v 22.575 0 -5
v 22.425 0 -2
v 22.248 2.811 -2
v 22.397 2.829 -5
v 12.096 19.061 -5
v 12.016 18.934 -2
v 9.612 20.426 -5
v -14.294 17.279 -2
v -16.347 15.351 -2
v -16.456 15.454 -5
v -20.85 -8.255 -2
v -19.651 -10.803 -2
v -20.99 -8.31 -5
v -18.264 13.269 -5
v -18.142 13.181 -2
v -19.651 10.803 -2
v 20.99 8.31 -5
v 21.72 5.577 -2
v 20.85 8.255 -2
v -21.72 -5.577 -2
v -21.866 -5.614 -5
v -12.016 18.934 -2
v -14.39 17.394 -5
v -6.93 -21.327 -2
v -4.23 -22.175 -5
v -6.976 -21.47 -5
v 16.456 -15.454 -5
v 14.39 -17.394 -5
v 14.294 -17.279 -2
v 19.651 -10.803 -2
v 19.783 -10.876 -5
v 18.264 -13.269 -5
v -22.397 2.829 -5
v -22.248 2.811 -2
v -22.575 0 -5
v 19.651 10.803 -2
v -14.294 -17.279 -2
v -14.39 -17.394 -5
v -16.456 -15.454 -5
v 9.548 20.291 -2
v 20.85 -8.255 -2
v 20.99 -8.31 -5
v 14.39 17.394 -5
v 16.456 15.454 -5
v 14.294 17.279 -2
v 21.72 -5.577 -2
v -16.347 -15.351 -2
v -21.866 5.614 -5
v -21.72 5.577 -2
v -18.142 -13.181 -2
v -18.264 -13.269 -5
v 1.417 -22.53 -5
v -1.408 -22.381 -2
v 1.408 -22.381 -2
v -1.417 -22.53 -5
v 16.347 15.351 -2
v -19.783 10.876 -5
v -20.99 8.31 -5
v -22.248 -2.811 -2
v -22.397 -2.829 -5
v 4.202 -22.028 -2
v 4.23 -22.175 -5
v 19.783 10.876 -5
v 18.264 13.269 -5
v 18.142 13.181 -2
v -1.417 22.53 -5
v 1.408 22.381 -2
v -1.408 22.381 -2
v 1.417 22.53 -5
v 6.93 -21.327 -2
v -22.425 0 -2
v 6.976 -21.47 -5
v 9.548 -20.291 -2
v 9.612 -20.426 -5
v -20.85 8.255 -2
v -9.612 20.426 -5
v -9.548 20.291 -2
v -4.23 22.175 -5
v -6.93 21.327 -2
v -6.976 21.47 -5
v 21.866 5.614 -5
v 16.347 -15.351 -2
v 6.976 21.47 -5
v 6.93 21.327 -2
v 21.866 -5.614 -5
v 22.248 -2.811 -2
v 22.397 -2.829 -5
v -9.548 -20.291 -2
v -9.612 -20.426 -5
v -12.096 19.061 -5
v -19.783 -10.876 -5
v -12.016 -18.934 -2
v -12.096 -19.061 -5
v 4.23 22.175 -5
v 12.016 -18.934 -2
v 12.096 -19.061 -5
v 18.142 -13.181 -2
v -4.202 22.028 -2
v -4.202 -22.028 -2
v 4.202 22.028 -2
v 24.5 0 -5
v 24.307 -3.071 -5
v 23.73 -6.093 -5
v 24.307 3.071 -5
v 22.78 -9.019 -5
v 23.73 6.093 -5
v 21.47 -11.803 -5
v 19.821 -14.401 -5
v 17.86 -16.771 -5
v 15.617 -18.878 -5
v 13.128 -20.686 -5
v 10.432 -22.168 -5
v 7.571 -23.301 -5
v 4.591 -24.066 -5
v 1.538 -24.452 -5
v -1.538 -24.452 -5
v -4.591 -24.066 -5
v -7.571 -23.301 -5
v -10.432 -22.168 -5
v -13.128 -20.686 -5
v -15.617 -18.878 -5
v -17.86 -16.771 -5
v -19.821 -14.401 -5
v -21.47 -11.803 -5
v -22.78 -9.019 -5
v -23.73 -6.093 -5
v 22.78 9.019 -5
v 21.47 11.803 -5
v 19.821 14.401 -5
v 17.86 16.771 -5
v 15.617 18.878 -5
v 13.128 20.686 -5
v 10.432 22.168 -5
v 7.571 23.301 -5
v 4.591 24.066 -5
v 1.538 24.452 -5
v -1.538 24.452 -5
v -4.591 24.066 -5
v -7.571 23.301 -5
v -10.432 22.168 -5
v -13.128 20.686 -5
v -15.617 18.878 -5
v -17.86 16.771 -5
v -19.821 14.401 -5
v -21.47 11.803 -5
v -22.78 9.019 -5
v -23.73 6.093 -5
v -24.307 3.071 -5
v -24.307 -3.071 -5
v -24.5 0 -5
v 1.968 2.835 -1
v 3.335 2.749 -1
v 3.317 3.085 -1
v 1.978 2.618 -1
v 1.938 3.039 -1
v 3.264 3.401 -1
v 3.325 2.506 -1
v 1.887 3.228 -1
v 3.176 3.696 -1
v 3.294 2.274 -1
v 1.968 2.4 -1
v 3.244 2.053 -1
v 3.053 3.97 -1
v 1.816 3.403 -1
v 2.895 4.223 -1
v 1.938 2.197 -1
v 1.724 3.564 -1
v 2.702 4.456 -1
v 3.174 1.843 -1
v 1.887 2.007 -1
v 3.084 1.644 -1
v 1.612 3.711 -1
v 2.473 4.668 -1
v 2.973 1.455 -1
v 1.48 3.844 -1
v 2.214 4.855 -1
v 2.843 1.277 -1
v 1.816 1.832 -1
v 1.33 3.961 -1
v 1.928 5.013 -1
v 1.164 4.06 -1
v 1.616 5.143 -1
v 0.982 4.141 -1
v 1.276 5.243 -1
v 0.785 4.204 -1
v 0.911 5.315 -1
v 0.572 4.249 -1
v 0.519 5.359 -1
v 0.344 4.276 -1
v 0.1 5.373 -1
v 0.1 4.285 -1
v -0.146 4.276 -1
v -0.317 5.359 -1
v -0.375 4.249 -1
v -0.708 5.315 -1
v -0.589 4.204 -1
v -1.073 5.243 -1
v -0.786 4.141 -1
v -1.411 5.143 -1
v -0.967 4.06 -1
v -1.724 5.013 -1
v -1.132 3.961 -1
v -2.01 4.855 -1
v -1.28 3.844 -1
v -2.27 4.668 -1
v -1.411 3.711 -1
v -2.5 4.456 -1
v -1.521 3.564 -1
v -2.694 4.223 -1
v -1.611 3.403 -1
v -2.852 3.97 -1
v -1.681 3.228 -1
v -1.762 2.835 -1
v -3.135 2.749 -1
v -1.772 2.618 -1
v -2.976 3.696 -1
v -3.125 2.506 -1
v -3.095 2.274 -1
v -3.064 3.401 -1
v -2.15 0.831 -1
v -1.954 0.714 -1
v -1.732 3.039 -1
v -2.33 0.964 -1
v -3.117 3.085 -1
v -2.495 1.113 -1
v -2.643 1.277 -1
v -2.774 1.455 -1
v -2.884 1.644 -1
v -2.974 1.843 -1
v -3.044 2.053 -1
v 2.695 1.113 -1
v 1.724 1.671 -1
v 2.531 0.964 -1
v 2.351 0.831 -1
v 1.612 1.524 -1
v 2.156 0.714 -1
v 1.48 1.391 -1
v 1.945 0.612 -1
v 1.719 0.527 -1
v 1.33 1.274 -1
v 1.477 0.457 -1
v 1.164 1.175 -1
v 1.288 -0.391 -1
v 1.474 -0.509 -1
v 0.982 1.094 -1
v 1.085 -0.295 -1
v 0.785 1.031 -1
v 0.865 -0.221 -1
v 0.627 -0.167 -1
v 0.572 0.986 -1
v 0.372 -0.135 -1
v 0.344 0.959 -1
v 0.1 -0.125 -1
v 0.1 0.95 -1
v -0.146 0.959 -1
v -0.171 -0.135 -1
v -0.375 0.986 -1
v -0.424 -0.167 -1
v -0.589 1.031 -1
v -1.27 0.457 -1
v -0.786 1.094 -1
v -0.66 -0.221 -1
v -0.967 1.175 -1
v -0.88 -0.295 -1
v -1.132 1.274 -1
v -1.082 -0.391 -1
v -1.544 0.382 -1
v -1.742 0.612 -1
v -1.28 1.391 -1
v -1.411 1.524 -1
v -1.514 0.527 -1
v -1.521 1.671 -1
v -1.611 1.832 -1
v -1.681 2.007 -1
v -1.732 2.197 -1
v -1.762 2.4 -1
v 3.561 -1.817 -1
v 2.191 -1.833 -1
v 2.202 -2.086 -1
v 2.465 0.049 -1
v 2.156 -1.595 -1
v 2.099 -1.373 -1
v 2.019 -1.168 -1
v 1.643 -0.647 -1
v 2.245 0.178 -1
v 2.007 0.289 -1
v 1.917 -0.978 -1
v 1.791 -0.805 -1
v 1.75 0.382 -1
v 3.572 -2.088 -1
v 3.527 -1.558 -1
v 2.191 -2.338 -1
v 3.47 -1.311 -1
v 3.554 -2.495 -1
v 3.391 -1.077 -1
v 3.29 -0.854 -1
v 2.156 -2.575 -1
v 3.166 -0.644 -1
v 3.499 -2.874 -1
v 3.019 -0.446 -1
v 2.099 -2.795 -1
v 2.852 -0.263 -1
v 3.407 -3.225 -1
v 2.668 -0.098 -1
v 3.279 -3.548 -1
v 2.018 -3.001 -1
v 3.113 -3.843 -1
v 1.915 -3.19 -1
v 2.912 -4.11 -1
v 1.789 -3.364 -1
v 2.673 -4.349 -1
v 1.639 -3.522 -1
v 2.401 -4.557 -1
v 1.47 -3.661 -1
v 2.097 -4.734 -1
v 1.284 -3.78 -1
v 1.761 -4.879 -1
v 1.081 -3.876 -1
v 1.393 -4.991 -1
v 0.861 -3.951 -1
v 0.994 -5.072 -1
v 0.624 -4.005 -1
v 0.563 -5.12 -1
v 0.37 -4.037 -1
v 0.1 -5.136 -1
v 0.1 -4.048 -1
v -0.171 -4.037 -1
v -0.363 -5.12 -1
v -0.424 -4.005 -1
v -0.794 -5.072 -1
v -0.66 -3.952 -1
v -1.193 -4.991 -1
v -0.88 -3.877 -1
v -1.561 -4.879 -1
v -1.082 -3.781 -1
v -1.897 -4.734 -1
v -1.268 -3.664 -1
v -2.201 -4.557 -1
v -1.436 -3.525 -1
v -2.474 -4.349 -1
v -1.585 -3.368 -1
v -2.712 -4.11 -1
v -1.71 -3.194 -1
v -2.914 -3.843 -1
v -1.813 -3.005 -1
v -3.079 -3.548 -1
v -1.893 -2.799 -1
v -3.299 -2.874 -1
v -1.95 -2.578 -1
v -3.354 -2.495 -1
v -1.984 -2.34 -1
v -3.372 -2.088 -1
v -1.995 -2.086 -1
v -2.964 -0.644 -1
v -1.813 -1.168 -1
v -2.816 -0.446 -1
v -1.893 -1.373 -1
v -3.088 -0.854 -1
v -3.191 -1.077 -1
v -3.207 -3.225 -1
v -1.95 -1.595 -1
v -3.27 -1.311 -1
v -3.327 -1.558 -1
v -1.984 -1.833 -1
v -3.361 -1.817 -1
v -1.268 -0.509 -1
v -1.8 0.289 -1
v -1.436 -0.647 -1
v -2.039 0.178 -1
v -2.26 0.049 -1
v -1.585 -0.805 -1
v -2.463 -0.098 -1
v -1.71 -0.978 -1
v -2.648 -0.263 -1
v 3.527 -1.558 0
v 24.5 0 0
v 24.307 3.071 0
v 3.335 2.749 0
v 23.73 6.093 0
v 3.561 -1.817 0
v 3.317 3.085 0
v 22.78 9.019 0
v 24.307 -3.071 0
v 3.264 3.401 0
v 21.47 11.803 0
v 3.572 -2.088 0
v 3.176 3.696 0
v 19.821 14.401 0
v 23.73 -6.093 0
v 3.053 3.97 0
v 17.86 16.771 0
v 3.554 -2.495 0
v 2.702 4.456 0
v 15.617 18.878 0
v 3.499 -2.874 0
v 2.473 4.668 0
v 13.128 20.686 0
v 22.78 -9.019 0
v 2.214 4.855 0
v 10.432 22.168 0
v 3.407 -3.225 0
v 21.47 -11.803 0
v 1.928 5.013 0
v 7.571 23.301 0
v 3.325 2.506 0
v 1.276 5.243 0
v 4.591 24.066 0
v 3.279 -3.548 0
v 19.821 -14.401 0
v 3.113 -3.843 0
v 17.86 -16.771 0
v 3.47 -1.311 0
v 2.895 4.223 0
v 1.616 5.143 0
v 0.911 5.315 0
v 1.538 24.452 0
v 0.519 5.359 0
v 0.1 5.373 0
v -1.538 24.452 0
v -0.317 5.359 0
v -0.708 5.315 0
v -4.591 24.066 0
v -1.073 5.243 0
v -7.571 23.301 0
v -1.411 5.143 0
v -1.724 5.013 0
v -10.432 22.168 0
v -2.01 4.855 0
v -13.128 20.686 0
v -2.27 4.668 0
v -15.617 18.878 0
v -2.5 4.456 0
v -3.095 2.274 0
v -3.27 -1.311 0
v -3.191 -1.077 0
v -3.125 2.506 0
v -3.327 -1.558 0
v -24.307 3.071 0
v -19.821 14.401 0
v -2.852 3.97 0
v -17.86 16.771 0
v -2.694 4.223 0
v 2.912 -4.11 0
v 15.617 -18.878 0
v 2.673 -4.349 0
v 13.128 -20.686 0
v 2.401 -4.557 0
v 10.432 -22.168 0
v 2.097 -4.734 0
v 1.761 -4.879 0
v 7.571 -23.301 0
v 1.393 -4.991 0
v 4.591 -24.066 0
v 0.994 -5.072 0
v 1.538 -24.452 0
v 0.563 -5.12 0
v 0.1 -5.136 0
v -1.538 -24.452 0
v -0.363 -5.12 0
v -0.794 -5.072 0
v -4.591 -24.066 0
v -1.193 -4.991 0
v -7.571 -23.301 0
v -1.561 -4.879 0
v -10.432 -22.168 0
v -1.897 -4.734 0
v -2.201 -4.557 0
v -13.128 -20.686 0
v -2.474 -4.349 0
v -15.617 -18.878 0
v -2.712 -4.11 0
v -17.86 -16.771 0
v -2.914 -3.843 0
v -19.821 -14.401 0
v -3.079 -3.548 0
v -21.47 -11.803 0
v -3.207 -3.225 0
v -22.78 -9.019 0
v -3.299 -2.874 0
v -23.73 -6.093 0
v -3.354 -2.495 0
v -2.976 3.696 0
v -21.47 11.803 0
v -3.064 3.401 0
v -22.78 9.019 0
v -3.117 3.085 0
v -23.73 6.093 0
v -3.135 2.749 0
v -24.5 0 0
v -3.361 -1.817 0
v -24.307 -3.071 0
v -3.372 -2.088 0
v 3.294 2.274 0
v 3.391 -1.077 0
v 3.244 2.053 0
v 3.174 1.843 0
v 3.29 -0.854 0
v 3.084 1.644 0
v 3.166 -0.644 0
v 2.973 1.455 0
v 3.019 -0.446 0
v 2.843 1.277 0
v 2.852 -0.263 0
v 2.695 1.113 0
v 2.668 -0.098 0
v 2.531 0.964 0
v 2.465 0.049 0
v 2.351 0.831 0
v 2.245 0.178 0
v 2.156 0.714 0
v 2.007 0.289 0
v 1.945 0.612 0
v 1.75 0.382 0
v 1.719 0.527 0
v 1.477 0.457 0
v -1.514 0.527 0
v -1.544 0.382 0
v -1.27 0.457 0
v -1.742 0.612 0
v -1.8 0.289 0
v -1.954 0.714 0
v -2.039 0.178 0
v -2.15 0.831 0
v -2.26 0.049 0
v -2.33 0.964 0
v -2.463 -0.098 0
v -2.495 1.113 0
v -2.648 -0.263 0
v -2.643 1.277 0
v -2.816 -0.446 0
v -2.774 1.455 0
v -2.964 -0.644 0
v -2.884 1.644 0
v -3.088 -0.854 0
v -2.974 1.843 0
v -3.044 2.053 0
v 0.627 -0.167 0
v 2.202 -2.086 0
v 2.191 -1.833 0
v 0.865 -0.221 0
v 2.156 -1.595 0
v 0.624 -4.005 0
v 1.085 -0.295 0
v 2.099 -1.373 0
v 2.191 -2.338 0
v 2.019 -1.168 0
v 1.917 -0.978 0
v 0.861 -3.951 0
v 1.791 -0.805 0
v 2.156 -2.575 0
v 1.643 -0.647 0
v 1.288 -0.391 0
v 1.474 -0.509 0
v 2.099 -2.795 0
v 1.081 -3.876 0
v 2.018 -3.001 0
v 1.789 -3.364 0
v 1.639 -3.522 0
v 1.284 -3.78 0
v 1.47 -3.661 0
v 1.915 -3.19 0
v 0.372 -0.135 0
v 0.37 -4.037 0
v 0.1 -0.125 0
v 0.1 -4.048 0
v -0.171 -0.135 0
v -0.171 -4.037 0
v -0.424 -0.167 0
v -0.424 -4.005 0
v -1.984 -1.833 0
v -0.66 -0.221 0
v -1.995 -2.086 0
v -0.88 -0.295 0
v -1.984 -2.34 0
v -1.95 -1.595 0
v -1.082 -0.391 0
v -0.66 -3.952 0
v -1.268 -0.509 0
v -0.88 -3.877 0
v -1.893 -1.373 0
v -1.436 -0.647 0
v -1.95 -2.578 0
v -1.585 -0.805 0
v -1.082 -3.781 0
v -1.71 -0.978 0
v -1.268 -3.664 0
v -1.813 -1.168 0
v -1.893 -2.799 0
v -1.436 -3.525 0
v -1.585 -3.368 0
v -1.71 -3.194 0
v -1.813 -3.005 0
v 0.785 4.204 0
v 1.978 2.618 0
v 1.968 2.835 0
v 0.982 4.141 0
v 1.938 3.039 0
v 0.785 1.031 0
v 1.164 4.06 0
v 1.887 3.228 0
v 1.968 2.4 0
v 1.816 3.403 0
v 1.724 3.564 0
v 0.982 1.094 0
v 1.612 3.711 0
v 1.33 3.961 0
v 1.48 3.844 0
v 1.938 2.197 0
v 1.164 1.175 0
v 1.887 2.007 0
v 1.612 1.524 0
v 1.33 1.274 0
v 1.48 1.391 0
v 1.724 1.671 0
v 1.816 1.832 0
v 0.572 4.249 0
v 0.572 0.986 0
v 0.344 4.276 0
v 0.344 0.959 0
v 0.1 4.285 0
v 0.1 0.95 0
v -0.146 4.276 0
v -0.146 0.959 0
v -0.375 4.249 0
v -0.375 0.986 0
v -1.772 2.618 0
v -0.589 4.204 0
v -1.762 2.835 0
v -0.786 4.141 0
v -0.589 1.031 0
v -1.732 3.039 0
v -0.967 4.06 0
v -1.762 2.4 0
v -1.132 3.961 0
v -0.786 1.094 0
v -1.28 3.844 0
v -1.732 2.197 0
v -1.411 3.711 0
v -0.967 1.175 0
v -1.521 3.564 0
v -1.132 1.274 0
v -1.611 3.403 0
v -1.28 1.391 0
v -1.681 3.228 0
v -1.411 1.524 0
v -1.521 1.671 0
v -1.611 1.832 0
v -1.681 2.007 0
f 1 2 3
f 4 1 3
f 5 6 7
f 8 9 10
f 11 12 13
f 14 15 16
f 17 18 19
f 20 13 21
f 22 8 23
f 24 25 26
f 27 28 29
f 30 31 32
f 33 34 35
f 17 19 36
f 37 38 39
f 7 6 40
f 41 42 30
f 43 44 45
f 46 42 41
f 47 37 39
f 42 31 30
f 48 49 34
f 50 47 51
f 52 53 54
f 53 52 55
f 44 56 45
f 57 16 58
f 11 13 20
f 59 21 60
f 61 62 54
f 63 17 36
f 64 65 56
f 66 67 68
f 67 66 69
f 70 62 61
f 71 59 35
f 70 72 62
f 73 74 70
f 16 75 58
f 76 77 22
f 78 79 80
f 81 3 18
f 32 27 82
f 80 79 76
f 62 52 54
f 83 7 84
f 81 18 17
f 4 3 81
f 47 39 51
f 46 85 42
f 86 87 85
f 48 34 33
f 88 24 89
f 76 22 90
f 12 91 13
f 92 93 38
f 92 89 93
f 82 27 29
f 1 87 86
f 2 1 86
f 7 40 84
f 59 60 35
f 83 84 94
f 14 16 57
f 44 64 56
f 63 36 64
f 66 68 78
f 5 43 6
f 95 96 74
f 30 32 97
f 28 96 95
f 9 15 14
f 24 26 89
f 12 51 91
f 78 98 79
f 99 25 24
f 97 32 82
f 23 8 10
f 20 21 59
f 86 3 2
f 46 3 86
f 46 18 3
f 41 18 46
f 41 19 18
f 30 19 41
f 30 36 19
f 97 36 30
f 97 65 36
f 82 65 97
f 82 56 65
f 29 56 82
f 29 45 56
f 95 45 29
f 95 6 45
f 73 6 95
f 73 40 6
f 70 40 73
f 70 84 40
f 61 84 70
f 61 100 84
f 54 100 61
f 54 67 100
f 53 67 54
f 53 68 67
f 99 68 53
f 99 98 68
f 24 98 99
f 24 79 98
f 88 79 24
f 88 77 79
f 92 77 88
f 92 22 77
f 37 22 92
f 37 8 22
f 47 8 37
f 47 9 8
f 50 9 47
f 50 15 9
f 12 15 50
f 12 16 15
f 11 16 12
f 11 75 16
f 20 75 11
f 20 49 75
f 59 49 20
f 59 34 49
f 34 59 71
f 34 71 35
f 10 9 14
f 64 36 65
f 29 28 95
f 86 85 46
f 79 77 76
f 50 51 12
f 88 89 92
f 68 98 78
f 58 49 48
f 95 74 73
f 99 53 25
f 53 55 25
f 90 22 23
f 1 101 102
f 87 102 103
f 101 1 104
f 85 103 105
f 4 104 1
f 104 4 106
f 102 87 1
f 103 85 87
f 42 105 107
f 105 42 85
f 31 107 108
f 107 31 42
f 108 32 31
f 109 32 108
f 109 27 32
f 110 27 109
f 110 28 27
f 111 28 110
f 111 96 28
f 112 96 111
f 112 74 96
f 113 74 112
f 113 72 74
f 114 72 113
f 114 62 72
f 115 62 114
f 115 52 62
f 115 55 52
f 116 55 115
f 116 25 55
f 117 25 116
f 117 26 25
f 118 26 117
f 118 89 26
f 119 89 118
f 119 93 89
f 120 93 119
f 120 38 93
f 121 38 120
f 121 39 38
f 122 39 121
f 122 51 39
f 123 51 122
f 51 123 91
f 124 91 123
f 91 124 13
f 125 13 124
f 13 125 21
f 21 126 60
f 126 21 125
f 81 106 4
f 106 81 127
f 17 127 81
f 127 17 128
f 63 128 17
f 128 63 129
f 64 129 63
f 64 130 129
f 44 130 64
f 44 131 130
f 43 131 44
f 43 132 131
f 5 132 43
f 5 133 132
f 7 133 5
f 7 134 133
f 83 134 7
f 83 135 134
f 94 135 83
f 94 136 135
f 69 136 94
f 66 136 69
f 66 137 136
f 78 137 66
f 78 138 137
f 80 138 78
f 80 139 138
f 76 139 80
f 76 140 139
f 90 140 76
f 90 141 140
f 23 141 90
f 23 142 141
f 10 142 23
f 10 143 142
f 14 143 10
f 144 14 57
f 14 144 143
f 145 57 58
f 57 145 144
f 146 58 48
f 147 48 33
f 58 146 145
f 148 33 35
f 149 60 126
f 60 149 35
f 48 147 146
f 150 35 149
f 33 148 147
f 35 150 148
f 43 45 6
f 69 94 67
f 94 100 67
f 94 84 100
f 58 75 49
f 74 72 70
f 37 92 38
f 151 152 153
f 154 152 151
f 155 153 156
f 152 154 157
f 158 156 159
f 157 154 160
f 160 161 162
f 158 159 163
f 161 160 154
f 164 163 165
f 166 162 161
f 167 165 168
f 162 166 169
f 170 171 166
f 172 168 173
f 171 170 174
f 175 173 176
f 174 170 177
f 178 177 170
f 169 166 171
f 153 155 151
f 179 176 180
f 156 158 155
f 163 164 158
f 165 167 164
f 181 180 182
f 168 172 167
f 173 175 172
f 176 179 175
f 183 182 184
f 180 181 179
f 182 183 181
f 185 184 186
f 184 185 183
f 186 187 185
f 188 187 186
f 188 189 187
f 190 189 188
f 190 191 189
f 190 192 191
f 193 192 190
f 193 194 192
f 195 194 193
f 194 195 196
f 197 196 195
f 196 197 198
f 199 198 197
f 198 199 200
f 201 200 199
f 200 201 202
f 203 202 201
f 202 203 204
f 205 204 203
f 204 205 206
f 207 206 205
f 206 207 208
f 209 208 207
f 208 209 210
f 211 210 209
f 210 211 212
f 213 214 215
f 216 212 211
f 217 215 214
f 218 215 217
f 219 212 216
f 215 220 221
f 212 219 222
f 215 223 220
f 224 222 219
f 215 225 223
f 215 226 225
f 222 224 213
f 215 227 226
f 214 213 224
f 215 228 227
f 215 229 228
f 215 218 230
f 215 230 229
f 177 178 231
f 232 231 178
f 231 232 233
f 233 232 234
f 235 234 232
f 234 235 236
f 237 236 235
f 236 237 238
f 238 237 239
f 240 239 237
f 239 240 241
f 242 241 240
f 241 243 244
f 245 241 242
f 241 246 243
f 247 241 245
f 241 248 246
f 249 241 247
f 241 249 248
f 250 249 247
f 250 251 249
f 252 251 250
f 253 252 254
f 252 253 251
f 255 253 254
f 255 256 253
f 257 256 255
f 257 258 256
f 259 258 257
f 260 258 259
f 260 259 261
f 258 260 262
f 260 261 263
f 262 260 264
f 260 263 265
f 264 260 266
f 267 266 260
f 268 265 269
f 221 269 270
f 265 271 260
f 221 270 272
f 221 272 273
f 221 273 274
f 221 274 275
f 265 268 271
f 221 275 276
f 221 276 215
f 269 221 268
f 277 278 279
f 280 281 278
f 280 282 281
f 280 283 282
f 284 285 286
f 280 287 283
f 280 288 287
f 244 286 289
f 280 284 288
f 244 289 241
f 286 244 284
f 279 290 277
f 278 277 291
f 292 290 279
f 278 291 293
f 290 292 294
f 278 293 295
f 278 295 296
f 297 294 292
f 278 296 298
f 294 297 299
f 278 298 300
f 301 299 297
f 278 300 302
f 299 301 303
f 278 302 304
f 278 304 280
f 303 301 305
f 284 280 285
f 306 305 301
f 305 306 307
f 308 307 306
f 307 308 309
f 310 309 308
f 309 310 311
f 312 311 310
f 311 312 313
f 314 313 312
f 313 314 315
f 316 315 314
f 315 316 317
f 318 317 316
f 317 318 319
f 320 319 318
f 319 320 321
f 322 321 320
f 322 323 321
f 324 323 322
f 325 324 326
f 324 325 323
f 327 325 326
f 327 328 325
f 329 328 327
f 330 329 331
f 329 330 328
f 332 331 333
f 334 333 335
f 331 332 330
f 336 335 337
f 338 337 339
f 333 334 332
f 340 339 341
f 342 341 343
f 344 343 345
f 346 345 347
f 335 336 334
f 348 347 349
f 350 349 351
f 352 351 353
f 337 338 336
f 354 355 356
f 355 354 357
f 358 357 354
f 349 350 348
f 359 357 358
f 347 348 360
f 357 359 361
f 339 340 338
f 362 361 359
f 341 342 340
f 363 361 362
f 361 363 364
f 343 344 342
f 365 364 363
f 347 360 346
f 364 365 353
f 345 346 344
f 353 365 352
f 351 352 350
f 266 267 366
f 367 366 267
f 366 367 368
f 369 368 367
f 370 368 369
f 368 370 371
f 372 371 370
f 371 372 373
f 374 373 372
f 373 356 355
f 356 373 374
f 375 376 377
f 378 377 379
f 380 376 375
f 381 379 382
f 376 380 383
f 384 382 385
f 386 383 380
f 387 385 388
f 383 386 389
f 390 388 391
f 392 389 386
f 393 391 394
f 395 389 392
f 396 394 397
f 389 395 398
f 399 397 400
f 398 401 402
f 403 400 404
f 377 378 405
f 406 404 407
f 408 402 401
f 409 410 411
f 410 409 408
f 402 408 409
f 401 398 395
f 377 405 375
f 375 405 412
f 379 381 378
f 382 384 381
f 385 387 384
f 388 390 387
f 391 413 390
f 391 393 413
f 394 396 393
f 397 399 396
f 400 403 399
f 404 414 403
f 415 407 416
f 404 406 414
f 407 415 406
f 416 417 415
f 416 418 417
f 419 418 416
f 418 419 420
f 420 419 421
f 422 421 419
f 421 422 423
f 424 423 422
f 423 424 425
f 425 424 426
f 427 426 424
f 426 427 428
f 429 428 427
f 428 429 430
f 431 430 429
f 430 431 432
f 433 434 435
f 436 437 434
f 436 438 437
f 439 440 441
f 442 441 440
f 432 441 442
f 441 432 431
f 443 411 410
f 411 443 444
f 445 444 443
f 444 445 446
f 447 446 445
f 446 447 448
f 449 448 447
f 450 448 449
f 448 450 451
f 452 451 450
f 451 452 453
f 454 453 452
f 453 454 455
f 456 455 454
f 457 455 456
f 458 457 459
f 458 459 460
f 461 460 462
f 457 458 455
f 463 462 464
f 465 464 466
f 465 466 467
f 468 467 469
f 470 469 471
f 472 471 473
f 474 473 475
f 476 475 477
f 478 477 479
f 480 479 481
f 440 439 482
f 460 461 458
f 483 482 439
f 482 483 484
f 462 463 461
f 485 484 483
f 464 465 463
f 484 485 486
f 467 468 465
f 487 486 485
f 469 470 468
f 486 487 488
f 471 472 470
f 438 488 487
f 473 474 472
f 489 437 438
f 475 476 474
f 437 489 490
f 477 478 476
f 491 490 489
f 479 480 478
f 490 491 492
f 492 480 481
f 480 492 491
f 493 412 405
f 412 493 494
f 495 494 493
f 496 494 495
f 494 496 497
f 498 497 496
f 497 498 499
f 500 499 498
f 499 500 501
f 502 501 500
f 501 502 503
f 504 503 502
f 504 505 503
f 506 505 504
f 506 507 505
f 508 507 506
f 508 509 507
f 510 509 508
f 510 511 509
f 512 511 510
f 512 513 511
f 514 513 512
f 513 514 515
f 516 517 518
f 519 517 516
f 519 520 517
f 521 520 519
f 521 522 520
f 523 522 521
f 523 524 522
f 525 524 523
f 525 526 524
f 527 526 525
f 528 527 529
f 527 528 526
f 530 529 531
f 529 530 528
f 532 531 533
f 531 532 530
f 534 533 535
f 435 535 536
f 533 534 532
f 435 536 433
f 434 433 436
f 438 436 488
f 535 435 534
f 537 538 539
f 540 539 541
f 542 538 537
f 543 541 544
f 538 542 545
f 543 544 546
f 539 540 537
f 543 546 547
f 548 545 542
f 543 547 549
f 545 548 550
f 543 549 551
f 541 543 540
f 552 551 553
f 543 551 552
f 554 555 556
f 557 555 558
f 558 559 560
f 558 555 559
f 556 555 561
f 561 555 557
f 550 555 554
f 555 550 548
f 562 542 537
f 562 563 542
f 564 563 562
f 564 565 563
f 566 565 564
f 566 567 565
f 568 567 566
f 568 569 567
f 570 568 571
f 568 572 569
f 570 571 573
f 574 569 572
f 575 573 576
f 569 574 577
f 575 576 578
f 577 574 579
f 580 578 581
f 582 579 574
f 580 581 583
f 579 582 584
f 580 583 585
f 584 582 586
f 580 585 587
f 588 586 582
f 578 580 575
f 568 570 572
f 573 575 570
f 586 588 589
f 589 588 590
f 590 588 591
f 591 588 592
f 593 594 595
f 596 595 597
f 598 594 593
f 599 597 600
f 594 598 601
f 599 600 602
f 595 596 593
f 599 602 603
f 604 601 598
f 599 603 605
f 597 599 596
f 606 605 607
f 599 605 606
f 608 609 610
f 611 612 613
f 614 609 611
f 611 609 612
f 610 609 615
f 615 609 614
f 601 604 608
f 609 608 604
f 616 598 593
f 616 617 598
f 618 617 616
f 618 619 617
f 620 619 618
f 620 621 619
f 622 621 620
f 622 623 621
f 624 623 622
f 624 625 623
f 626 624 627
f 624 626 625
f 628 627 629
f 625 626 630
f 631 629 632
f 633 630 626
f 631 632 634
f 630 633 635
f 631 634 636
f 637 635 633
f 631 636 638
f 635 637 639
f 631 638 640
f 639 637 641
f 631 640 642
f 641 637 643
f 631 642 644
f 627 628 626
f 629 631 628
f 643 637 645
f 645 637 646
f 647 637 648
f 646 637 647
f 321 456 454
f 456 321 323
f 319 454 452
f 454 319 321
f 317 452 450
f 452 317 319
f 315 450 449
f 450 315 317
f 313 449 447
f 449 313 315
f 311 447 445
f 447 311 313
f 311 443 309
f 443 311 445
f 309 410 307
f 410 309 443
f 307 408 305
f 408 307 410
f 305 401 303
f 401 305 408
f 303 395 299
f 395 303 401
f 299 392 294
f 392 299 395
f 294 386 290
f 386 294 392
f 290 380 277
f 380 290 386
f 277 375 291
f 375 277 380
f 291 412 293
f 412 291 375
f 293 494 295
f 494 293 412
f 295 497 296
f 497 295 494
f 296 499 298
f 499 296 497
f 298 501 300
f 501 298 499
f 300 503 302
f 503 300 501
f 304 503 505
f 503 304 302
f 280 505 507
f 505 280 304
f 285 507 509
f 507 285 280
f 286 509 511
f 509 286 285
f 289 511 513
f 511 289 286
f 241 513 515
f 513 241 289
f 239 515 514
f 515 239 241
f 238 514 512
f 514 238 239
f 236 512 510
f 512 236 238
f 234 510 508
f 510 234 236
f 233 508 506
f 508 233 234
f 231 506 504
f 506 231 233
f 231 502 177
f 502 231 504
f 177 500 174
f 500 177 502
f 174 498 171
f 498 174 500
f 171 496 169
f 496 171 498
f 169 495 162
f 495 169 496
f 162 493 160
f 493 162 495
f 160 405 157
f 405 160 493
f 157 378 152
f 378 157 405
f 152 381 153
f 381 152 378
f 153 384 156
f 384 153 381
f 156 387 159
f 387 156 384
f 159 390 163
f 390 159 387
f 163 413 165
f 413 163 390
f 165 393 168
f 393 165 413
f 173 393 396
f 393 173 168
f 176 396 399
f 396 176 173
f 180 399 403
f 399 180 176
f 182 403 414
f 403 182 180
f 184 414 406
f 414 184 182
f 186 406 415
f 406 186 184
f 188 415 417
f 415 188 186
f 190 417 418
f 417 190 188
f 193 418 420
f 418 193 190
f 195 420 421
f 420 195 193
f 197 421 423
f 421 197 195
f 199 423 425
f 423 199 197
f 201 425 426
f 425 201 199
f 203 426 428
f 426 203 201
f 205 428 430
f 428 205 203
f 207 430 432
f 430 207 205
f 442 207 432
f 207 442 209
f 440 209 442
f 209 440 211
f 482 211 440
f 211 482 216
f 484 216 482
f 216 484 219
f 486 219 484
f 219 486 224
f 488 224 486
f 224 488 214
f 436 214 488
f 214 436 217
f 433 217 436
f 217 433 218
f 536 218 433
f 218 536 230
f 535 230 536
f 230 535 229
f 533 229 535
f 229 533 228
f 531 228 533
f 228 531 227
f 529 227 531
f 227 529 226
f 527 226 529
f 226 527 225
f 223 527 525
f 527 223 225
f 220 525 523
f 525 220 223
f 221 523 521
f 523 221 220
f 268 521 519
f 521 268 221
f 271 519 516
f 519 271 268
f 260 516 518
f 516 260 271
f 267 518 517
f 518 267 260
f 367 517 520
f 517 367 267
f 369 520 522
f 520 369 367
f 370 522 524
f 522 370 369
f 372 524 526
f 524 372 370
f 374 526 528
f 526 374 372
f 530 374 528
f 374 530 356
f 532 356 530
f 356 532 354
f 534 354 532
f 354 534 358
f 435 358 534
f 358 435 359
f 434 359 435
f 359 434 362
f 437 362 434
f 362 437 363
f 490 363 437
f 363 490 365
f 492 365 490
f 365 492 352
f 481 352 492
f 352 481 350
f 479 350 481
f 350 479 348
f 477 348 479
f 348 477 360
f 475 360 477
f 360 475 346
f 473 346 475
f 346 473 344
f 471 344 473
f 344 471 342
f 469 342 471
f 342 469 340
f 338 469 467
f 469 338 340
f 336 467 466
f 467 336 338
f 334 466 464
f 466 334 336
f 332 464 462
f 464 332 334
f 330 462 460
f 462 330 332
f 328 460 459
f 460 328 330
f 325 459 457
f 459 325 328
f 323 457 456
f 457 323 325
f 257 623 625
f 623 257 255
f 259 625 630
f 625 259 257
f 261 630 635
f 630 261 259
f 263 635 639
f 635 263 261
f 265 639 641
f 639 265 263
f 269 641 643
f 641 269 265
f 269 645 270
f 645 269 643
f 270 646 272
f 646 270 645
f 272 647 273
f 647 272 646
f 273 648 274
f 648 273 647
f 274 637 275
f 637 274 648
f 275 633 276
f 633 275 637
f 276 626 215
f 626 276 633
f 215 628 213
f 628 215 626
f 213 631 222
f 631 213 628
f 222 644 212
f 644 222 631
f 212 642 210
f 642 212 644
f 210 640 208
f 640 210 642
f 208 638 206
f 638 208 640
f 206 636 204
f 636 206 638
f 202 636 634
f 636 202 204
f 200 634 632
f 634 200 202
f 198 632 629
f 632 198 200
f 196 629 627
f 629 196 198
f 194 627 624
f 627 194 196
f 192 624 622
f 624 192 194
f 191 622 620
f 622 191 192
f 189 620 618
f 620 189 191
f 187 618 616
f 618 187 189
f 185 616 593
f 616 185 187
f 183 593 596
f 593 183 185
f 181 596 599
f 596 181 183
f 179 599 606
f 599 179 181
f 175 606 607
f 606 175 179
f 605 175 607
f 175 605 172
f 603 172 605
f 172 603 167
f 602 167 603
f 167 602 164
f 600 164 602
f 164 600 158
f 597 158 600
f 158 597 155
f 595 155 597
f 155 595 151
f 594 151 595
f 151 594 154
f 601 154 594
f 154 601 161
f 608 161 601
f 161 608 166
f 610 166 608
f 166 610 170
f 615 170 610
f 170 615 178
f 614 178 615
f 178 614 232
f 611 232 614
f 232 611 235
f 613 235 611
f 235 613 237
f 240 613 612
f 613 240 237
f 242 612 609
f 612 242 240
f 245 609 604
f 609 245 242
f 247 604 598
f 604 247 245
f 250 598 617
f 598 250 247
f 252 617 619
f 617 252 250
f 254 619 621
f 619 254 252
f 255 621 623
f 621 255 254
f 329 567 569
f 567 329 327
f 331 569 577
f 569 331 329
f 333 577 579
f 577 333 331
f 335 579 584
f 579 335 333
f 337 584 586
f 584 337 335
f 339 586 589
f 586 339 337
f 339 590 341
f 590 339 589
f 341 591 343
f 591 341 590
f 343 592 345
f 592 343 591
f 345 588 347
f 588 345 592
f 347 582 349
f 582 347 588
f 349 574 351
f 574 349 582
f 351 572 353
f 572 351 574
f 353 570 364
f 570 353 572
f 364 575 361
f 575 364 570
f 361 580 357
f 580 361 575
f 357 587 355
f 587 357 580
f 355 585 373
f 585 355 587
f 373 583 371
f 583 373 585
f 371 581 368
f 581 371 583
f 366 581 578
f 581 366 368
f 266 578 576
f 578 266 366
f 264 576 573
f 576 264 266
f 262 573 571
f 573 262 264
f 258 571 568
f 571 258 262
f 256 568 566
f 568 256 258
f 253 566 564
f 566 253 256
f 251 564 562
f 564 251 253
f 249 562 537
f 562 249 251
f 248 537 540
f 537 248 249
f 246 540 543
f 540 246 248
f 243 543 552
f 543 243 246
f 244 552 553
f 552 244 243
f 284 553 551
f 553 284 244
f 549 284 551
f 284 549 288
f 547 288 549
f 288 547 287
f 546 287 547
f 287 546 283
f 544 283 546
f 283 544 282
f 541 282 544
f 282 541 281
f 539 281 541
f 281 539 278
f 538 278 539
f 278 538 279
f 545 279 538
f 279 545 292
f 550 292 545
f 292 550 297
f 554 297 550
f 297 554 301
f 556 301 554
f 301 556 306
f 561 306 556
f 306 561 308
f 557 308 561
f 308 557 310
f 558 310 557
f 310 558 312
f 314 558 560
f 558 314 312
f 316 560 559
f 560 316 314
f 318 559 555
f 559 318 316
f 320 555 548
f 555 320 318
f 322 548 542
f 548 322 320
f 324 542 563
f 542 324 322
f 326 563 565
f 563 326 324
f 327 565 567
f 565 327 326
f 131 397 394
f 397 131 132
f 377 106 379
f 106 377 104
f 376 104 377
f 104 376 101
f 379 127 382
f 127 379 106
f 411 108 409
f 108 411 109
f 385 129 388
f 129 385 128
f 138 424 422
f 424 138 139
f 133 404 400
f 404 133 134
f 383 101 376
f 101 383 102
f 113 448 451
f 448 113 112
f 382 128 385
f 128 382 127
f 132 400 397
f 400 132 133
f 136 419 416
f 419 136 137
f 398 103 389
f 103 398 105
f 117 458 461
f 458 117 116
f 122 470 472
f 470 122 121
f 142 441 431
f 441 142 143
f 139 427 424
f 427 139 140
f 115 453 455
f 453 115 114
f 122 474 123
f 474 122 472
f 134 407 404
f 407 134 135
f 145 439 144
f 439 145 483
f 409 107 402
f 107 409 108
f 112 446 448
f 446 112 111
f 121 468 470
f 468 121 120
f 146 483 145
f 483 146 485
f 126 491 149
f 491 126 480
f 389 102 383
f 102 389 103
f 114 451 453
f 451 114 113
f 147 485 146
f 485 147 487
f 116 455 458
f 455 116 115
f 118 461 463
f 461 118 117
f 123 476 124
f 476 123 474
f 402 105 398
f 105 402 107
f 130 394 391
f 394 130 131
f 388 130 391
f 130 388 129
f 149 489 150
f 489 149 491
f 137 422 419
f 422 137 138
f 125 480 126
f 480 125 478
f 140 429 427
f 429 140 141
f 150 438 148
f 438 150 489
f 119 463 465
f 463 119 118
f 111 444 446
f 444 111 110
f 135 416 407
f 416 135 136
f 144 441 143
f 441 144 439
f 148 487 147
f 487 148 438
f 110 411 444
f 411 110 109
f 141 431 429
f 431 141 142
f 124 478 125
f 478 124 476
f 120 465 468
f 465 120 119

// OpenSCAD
$fn = 50;

difference() {
	union() {
		translate(v = [0, 0, -5.0]) {
			cylinder(h = 5, r = 24.5);
		}
	}
	union() {
		#translate(v = [0, 0, -5.0]) {
			cylinder(h = 3, r1 = 22.575, r2 = 22.425);
		}
		translate(v = [0, 0, -1]) {
			linear_extrude(height = 1) {
				text(font = "Impact", halign = "center", size = 10, text = "8", valign = "center");
			}
		}
	}
}
